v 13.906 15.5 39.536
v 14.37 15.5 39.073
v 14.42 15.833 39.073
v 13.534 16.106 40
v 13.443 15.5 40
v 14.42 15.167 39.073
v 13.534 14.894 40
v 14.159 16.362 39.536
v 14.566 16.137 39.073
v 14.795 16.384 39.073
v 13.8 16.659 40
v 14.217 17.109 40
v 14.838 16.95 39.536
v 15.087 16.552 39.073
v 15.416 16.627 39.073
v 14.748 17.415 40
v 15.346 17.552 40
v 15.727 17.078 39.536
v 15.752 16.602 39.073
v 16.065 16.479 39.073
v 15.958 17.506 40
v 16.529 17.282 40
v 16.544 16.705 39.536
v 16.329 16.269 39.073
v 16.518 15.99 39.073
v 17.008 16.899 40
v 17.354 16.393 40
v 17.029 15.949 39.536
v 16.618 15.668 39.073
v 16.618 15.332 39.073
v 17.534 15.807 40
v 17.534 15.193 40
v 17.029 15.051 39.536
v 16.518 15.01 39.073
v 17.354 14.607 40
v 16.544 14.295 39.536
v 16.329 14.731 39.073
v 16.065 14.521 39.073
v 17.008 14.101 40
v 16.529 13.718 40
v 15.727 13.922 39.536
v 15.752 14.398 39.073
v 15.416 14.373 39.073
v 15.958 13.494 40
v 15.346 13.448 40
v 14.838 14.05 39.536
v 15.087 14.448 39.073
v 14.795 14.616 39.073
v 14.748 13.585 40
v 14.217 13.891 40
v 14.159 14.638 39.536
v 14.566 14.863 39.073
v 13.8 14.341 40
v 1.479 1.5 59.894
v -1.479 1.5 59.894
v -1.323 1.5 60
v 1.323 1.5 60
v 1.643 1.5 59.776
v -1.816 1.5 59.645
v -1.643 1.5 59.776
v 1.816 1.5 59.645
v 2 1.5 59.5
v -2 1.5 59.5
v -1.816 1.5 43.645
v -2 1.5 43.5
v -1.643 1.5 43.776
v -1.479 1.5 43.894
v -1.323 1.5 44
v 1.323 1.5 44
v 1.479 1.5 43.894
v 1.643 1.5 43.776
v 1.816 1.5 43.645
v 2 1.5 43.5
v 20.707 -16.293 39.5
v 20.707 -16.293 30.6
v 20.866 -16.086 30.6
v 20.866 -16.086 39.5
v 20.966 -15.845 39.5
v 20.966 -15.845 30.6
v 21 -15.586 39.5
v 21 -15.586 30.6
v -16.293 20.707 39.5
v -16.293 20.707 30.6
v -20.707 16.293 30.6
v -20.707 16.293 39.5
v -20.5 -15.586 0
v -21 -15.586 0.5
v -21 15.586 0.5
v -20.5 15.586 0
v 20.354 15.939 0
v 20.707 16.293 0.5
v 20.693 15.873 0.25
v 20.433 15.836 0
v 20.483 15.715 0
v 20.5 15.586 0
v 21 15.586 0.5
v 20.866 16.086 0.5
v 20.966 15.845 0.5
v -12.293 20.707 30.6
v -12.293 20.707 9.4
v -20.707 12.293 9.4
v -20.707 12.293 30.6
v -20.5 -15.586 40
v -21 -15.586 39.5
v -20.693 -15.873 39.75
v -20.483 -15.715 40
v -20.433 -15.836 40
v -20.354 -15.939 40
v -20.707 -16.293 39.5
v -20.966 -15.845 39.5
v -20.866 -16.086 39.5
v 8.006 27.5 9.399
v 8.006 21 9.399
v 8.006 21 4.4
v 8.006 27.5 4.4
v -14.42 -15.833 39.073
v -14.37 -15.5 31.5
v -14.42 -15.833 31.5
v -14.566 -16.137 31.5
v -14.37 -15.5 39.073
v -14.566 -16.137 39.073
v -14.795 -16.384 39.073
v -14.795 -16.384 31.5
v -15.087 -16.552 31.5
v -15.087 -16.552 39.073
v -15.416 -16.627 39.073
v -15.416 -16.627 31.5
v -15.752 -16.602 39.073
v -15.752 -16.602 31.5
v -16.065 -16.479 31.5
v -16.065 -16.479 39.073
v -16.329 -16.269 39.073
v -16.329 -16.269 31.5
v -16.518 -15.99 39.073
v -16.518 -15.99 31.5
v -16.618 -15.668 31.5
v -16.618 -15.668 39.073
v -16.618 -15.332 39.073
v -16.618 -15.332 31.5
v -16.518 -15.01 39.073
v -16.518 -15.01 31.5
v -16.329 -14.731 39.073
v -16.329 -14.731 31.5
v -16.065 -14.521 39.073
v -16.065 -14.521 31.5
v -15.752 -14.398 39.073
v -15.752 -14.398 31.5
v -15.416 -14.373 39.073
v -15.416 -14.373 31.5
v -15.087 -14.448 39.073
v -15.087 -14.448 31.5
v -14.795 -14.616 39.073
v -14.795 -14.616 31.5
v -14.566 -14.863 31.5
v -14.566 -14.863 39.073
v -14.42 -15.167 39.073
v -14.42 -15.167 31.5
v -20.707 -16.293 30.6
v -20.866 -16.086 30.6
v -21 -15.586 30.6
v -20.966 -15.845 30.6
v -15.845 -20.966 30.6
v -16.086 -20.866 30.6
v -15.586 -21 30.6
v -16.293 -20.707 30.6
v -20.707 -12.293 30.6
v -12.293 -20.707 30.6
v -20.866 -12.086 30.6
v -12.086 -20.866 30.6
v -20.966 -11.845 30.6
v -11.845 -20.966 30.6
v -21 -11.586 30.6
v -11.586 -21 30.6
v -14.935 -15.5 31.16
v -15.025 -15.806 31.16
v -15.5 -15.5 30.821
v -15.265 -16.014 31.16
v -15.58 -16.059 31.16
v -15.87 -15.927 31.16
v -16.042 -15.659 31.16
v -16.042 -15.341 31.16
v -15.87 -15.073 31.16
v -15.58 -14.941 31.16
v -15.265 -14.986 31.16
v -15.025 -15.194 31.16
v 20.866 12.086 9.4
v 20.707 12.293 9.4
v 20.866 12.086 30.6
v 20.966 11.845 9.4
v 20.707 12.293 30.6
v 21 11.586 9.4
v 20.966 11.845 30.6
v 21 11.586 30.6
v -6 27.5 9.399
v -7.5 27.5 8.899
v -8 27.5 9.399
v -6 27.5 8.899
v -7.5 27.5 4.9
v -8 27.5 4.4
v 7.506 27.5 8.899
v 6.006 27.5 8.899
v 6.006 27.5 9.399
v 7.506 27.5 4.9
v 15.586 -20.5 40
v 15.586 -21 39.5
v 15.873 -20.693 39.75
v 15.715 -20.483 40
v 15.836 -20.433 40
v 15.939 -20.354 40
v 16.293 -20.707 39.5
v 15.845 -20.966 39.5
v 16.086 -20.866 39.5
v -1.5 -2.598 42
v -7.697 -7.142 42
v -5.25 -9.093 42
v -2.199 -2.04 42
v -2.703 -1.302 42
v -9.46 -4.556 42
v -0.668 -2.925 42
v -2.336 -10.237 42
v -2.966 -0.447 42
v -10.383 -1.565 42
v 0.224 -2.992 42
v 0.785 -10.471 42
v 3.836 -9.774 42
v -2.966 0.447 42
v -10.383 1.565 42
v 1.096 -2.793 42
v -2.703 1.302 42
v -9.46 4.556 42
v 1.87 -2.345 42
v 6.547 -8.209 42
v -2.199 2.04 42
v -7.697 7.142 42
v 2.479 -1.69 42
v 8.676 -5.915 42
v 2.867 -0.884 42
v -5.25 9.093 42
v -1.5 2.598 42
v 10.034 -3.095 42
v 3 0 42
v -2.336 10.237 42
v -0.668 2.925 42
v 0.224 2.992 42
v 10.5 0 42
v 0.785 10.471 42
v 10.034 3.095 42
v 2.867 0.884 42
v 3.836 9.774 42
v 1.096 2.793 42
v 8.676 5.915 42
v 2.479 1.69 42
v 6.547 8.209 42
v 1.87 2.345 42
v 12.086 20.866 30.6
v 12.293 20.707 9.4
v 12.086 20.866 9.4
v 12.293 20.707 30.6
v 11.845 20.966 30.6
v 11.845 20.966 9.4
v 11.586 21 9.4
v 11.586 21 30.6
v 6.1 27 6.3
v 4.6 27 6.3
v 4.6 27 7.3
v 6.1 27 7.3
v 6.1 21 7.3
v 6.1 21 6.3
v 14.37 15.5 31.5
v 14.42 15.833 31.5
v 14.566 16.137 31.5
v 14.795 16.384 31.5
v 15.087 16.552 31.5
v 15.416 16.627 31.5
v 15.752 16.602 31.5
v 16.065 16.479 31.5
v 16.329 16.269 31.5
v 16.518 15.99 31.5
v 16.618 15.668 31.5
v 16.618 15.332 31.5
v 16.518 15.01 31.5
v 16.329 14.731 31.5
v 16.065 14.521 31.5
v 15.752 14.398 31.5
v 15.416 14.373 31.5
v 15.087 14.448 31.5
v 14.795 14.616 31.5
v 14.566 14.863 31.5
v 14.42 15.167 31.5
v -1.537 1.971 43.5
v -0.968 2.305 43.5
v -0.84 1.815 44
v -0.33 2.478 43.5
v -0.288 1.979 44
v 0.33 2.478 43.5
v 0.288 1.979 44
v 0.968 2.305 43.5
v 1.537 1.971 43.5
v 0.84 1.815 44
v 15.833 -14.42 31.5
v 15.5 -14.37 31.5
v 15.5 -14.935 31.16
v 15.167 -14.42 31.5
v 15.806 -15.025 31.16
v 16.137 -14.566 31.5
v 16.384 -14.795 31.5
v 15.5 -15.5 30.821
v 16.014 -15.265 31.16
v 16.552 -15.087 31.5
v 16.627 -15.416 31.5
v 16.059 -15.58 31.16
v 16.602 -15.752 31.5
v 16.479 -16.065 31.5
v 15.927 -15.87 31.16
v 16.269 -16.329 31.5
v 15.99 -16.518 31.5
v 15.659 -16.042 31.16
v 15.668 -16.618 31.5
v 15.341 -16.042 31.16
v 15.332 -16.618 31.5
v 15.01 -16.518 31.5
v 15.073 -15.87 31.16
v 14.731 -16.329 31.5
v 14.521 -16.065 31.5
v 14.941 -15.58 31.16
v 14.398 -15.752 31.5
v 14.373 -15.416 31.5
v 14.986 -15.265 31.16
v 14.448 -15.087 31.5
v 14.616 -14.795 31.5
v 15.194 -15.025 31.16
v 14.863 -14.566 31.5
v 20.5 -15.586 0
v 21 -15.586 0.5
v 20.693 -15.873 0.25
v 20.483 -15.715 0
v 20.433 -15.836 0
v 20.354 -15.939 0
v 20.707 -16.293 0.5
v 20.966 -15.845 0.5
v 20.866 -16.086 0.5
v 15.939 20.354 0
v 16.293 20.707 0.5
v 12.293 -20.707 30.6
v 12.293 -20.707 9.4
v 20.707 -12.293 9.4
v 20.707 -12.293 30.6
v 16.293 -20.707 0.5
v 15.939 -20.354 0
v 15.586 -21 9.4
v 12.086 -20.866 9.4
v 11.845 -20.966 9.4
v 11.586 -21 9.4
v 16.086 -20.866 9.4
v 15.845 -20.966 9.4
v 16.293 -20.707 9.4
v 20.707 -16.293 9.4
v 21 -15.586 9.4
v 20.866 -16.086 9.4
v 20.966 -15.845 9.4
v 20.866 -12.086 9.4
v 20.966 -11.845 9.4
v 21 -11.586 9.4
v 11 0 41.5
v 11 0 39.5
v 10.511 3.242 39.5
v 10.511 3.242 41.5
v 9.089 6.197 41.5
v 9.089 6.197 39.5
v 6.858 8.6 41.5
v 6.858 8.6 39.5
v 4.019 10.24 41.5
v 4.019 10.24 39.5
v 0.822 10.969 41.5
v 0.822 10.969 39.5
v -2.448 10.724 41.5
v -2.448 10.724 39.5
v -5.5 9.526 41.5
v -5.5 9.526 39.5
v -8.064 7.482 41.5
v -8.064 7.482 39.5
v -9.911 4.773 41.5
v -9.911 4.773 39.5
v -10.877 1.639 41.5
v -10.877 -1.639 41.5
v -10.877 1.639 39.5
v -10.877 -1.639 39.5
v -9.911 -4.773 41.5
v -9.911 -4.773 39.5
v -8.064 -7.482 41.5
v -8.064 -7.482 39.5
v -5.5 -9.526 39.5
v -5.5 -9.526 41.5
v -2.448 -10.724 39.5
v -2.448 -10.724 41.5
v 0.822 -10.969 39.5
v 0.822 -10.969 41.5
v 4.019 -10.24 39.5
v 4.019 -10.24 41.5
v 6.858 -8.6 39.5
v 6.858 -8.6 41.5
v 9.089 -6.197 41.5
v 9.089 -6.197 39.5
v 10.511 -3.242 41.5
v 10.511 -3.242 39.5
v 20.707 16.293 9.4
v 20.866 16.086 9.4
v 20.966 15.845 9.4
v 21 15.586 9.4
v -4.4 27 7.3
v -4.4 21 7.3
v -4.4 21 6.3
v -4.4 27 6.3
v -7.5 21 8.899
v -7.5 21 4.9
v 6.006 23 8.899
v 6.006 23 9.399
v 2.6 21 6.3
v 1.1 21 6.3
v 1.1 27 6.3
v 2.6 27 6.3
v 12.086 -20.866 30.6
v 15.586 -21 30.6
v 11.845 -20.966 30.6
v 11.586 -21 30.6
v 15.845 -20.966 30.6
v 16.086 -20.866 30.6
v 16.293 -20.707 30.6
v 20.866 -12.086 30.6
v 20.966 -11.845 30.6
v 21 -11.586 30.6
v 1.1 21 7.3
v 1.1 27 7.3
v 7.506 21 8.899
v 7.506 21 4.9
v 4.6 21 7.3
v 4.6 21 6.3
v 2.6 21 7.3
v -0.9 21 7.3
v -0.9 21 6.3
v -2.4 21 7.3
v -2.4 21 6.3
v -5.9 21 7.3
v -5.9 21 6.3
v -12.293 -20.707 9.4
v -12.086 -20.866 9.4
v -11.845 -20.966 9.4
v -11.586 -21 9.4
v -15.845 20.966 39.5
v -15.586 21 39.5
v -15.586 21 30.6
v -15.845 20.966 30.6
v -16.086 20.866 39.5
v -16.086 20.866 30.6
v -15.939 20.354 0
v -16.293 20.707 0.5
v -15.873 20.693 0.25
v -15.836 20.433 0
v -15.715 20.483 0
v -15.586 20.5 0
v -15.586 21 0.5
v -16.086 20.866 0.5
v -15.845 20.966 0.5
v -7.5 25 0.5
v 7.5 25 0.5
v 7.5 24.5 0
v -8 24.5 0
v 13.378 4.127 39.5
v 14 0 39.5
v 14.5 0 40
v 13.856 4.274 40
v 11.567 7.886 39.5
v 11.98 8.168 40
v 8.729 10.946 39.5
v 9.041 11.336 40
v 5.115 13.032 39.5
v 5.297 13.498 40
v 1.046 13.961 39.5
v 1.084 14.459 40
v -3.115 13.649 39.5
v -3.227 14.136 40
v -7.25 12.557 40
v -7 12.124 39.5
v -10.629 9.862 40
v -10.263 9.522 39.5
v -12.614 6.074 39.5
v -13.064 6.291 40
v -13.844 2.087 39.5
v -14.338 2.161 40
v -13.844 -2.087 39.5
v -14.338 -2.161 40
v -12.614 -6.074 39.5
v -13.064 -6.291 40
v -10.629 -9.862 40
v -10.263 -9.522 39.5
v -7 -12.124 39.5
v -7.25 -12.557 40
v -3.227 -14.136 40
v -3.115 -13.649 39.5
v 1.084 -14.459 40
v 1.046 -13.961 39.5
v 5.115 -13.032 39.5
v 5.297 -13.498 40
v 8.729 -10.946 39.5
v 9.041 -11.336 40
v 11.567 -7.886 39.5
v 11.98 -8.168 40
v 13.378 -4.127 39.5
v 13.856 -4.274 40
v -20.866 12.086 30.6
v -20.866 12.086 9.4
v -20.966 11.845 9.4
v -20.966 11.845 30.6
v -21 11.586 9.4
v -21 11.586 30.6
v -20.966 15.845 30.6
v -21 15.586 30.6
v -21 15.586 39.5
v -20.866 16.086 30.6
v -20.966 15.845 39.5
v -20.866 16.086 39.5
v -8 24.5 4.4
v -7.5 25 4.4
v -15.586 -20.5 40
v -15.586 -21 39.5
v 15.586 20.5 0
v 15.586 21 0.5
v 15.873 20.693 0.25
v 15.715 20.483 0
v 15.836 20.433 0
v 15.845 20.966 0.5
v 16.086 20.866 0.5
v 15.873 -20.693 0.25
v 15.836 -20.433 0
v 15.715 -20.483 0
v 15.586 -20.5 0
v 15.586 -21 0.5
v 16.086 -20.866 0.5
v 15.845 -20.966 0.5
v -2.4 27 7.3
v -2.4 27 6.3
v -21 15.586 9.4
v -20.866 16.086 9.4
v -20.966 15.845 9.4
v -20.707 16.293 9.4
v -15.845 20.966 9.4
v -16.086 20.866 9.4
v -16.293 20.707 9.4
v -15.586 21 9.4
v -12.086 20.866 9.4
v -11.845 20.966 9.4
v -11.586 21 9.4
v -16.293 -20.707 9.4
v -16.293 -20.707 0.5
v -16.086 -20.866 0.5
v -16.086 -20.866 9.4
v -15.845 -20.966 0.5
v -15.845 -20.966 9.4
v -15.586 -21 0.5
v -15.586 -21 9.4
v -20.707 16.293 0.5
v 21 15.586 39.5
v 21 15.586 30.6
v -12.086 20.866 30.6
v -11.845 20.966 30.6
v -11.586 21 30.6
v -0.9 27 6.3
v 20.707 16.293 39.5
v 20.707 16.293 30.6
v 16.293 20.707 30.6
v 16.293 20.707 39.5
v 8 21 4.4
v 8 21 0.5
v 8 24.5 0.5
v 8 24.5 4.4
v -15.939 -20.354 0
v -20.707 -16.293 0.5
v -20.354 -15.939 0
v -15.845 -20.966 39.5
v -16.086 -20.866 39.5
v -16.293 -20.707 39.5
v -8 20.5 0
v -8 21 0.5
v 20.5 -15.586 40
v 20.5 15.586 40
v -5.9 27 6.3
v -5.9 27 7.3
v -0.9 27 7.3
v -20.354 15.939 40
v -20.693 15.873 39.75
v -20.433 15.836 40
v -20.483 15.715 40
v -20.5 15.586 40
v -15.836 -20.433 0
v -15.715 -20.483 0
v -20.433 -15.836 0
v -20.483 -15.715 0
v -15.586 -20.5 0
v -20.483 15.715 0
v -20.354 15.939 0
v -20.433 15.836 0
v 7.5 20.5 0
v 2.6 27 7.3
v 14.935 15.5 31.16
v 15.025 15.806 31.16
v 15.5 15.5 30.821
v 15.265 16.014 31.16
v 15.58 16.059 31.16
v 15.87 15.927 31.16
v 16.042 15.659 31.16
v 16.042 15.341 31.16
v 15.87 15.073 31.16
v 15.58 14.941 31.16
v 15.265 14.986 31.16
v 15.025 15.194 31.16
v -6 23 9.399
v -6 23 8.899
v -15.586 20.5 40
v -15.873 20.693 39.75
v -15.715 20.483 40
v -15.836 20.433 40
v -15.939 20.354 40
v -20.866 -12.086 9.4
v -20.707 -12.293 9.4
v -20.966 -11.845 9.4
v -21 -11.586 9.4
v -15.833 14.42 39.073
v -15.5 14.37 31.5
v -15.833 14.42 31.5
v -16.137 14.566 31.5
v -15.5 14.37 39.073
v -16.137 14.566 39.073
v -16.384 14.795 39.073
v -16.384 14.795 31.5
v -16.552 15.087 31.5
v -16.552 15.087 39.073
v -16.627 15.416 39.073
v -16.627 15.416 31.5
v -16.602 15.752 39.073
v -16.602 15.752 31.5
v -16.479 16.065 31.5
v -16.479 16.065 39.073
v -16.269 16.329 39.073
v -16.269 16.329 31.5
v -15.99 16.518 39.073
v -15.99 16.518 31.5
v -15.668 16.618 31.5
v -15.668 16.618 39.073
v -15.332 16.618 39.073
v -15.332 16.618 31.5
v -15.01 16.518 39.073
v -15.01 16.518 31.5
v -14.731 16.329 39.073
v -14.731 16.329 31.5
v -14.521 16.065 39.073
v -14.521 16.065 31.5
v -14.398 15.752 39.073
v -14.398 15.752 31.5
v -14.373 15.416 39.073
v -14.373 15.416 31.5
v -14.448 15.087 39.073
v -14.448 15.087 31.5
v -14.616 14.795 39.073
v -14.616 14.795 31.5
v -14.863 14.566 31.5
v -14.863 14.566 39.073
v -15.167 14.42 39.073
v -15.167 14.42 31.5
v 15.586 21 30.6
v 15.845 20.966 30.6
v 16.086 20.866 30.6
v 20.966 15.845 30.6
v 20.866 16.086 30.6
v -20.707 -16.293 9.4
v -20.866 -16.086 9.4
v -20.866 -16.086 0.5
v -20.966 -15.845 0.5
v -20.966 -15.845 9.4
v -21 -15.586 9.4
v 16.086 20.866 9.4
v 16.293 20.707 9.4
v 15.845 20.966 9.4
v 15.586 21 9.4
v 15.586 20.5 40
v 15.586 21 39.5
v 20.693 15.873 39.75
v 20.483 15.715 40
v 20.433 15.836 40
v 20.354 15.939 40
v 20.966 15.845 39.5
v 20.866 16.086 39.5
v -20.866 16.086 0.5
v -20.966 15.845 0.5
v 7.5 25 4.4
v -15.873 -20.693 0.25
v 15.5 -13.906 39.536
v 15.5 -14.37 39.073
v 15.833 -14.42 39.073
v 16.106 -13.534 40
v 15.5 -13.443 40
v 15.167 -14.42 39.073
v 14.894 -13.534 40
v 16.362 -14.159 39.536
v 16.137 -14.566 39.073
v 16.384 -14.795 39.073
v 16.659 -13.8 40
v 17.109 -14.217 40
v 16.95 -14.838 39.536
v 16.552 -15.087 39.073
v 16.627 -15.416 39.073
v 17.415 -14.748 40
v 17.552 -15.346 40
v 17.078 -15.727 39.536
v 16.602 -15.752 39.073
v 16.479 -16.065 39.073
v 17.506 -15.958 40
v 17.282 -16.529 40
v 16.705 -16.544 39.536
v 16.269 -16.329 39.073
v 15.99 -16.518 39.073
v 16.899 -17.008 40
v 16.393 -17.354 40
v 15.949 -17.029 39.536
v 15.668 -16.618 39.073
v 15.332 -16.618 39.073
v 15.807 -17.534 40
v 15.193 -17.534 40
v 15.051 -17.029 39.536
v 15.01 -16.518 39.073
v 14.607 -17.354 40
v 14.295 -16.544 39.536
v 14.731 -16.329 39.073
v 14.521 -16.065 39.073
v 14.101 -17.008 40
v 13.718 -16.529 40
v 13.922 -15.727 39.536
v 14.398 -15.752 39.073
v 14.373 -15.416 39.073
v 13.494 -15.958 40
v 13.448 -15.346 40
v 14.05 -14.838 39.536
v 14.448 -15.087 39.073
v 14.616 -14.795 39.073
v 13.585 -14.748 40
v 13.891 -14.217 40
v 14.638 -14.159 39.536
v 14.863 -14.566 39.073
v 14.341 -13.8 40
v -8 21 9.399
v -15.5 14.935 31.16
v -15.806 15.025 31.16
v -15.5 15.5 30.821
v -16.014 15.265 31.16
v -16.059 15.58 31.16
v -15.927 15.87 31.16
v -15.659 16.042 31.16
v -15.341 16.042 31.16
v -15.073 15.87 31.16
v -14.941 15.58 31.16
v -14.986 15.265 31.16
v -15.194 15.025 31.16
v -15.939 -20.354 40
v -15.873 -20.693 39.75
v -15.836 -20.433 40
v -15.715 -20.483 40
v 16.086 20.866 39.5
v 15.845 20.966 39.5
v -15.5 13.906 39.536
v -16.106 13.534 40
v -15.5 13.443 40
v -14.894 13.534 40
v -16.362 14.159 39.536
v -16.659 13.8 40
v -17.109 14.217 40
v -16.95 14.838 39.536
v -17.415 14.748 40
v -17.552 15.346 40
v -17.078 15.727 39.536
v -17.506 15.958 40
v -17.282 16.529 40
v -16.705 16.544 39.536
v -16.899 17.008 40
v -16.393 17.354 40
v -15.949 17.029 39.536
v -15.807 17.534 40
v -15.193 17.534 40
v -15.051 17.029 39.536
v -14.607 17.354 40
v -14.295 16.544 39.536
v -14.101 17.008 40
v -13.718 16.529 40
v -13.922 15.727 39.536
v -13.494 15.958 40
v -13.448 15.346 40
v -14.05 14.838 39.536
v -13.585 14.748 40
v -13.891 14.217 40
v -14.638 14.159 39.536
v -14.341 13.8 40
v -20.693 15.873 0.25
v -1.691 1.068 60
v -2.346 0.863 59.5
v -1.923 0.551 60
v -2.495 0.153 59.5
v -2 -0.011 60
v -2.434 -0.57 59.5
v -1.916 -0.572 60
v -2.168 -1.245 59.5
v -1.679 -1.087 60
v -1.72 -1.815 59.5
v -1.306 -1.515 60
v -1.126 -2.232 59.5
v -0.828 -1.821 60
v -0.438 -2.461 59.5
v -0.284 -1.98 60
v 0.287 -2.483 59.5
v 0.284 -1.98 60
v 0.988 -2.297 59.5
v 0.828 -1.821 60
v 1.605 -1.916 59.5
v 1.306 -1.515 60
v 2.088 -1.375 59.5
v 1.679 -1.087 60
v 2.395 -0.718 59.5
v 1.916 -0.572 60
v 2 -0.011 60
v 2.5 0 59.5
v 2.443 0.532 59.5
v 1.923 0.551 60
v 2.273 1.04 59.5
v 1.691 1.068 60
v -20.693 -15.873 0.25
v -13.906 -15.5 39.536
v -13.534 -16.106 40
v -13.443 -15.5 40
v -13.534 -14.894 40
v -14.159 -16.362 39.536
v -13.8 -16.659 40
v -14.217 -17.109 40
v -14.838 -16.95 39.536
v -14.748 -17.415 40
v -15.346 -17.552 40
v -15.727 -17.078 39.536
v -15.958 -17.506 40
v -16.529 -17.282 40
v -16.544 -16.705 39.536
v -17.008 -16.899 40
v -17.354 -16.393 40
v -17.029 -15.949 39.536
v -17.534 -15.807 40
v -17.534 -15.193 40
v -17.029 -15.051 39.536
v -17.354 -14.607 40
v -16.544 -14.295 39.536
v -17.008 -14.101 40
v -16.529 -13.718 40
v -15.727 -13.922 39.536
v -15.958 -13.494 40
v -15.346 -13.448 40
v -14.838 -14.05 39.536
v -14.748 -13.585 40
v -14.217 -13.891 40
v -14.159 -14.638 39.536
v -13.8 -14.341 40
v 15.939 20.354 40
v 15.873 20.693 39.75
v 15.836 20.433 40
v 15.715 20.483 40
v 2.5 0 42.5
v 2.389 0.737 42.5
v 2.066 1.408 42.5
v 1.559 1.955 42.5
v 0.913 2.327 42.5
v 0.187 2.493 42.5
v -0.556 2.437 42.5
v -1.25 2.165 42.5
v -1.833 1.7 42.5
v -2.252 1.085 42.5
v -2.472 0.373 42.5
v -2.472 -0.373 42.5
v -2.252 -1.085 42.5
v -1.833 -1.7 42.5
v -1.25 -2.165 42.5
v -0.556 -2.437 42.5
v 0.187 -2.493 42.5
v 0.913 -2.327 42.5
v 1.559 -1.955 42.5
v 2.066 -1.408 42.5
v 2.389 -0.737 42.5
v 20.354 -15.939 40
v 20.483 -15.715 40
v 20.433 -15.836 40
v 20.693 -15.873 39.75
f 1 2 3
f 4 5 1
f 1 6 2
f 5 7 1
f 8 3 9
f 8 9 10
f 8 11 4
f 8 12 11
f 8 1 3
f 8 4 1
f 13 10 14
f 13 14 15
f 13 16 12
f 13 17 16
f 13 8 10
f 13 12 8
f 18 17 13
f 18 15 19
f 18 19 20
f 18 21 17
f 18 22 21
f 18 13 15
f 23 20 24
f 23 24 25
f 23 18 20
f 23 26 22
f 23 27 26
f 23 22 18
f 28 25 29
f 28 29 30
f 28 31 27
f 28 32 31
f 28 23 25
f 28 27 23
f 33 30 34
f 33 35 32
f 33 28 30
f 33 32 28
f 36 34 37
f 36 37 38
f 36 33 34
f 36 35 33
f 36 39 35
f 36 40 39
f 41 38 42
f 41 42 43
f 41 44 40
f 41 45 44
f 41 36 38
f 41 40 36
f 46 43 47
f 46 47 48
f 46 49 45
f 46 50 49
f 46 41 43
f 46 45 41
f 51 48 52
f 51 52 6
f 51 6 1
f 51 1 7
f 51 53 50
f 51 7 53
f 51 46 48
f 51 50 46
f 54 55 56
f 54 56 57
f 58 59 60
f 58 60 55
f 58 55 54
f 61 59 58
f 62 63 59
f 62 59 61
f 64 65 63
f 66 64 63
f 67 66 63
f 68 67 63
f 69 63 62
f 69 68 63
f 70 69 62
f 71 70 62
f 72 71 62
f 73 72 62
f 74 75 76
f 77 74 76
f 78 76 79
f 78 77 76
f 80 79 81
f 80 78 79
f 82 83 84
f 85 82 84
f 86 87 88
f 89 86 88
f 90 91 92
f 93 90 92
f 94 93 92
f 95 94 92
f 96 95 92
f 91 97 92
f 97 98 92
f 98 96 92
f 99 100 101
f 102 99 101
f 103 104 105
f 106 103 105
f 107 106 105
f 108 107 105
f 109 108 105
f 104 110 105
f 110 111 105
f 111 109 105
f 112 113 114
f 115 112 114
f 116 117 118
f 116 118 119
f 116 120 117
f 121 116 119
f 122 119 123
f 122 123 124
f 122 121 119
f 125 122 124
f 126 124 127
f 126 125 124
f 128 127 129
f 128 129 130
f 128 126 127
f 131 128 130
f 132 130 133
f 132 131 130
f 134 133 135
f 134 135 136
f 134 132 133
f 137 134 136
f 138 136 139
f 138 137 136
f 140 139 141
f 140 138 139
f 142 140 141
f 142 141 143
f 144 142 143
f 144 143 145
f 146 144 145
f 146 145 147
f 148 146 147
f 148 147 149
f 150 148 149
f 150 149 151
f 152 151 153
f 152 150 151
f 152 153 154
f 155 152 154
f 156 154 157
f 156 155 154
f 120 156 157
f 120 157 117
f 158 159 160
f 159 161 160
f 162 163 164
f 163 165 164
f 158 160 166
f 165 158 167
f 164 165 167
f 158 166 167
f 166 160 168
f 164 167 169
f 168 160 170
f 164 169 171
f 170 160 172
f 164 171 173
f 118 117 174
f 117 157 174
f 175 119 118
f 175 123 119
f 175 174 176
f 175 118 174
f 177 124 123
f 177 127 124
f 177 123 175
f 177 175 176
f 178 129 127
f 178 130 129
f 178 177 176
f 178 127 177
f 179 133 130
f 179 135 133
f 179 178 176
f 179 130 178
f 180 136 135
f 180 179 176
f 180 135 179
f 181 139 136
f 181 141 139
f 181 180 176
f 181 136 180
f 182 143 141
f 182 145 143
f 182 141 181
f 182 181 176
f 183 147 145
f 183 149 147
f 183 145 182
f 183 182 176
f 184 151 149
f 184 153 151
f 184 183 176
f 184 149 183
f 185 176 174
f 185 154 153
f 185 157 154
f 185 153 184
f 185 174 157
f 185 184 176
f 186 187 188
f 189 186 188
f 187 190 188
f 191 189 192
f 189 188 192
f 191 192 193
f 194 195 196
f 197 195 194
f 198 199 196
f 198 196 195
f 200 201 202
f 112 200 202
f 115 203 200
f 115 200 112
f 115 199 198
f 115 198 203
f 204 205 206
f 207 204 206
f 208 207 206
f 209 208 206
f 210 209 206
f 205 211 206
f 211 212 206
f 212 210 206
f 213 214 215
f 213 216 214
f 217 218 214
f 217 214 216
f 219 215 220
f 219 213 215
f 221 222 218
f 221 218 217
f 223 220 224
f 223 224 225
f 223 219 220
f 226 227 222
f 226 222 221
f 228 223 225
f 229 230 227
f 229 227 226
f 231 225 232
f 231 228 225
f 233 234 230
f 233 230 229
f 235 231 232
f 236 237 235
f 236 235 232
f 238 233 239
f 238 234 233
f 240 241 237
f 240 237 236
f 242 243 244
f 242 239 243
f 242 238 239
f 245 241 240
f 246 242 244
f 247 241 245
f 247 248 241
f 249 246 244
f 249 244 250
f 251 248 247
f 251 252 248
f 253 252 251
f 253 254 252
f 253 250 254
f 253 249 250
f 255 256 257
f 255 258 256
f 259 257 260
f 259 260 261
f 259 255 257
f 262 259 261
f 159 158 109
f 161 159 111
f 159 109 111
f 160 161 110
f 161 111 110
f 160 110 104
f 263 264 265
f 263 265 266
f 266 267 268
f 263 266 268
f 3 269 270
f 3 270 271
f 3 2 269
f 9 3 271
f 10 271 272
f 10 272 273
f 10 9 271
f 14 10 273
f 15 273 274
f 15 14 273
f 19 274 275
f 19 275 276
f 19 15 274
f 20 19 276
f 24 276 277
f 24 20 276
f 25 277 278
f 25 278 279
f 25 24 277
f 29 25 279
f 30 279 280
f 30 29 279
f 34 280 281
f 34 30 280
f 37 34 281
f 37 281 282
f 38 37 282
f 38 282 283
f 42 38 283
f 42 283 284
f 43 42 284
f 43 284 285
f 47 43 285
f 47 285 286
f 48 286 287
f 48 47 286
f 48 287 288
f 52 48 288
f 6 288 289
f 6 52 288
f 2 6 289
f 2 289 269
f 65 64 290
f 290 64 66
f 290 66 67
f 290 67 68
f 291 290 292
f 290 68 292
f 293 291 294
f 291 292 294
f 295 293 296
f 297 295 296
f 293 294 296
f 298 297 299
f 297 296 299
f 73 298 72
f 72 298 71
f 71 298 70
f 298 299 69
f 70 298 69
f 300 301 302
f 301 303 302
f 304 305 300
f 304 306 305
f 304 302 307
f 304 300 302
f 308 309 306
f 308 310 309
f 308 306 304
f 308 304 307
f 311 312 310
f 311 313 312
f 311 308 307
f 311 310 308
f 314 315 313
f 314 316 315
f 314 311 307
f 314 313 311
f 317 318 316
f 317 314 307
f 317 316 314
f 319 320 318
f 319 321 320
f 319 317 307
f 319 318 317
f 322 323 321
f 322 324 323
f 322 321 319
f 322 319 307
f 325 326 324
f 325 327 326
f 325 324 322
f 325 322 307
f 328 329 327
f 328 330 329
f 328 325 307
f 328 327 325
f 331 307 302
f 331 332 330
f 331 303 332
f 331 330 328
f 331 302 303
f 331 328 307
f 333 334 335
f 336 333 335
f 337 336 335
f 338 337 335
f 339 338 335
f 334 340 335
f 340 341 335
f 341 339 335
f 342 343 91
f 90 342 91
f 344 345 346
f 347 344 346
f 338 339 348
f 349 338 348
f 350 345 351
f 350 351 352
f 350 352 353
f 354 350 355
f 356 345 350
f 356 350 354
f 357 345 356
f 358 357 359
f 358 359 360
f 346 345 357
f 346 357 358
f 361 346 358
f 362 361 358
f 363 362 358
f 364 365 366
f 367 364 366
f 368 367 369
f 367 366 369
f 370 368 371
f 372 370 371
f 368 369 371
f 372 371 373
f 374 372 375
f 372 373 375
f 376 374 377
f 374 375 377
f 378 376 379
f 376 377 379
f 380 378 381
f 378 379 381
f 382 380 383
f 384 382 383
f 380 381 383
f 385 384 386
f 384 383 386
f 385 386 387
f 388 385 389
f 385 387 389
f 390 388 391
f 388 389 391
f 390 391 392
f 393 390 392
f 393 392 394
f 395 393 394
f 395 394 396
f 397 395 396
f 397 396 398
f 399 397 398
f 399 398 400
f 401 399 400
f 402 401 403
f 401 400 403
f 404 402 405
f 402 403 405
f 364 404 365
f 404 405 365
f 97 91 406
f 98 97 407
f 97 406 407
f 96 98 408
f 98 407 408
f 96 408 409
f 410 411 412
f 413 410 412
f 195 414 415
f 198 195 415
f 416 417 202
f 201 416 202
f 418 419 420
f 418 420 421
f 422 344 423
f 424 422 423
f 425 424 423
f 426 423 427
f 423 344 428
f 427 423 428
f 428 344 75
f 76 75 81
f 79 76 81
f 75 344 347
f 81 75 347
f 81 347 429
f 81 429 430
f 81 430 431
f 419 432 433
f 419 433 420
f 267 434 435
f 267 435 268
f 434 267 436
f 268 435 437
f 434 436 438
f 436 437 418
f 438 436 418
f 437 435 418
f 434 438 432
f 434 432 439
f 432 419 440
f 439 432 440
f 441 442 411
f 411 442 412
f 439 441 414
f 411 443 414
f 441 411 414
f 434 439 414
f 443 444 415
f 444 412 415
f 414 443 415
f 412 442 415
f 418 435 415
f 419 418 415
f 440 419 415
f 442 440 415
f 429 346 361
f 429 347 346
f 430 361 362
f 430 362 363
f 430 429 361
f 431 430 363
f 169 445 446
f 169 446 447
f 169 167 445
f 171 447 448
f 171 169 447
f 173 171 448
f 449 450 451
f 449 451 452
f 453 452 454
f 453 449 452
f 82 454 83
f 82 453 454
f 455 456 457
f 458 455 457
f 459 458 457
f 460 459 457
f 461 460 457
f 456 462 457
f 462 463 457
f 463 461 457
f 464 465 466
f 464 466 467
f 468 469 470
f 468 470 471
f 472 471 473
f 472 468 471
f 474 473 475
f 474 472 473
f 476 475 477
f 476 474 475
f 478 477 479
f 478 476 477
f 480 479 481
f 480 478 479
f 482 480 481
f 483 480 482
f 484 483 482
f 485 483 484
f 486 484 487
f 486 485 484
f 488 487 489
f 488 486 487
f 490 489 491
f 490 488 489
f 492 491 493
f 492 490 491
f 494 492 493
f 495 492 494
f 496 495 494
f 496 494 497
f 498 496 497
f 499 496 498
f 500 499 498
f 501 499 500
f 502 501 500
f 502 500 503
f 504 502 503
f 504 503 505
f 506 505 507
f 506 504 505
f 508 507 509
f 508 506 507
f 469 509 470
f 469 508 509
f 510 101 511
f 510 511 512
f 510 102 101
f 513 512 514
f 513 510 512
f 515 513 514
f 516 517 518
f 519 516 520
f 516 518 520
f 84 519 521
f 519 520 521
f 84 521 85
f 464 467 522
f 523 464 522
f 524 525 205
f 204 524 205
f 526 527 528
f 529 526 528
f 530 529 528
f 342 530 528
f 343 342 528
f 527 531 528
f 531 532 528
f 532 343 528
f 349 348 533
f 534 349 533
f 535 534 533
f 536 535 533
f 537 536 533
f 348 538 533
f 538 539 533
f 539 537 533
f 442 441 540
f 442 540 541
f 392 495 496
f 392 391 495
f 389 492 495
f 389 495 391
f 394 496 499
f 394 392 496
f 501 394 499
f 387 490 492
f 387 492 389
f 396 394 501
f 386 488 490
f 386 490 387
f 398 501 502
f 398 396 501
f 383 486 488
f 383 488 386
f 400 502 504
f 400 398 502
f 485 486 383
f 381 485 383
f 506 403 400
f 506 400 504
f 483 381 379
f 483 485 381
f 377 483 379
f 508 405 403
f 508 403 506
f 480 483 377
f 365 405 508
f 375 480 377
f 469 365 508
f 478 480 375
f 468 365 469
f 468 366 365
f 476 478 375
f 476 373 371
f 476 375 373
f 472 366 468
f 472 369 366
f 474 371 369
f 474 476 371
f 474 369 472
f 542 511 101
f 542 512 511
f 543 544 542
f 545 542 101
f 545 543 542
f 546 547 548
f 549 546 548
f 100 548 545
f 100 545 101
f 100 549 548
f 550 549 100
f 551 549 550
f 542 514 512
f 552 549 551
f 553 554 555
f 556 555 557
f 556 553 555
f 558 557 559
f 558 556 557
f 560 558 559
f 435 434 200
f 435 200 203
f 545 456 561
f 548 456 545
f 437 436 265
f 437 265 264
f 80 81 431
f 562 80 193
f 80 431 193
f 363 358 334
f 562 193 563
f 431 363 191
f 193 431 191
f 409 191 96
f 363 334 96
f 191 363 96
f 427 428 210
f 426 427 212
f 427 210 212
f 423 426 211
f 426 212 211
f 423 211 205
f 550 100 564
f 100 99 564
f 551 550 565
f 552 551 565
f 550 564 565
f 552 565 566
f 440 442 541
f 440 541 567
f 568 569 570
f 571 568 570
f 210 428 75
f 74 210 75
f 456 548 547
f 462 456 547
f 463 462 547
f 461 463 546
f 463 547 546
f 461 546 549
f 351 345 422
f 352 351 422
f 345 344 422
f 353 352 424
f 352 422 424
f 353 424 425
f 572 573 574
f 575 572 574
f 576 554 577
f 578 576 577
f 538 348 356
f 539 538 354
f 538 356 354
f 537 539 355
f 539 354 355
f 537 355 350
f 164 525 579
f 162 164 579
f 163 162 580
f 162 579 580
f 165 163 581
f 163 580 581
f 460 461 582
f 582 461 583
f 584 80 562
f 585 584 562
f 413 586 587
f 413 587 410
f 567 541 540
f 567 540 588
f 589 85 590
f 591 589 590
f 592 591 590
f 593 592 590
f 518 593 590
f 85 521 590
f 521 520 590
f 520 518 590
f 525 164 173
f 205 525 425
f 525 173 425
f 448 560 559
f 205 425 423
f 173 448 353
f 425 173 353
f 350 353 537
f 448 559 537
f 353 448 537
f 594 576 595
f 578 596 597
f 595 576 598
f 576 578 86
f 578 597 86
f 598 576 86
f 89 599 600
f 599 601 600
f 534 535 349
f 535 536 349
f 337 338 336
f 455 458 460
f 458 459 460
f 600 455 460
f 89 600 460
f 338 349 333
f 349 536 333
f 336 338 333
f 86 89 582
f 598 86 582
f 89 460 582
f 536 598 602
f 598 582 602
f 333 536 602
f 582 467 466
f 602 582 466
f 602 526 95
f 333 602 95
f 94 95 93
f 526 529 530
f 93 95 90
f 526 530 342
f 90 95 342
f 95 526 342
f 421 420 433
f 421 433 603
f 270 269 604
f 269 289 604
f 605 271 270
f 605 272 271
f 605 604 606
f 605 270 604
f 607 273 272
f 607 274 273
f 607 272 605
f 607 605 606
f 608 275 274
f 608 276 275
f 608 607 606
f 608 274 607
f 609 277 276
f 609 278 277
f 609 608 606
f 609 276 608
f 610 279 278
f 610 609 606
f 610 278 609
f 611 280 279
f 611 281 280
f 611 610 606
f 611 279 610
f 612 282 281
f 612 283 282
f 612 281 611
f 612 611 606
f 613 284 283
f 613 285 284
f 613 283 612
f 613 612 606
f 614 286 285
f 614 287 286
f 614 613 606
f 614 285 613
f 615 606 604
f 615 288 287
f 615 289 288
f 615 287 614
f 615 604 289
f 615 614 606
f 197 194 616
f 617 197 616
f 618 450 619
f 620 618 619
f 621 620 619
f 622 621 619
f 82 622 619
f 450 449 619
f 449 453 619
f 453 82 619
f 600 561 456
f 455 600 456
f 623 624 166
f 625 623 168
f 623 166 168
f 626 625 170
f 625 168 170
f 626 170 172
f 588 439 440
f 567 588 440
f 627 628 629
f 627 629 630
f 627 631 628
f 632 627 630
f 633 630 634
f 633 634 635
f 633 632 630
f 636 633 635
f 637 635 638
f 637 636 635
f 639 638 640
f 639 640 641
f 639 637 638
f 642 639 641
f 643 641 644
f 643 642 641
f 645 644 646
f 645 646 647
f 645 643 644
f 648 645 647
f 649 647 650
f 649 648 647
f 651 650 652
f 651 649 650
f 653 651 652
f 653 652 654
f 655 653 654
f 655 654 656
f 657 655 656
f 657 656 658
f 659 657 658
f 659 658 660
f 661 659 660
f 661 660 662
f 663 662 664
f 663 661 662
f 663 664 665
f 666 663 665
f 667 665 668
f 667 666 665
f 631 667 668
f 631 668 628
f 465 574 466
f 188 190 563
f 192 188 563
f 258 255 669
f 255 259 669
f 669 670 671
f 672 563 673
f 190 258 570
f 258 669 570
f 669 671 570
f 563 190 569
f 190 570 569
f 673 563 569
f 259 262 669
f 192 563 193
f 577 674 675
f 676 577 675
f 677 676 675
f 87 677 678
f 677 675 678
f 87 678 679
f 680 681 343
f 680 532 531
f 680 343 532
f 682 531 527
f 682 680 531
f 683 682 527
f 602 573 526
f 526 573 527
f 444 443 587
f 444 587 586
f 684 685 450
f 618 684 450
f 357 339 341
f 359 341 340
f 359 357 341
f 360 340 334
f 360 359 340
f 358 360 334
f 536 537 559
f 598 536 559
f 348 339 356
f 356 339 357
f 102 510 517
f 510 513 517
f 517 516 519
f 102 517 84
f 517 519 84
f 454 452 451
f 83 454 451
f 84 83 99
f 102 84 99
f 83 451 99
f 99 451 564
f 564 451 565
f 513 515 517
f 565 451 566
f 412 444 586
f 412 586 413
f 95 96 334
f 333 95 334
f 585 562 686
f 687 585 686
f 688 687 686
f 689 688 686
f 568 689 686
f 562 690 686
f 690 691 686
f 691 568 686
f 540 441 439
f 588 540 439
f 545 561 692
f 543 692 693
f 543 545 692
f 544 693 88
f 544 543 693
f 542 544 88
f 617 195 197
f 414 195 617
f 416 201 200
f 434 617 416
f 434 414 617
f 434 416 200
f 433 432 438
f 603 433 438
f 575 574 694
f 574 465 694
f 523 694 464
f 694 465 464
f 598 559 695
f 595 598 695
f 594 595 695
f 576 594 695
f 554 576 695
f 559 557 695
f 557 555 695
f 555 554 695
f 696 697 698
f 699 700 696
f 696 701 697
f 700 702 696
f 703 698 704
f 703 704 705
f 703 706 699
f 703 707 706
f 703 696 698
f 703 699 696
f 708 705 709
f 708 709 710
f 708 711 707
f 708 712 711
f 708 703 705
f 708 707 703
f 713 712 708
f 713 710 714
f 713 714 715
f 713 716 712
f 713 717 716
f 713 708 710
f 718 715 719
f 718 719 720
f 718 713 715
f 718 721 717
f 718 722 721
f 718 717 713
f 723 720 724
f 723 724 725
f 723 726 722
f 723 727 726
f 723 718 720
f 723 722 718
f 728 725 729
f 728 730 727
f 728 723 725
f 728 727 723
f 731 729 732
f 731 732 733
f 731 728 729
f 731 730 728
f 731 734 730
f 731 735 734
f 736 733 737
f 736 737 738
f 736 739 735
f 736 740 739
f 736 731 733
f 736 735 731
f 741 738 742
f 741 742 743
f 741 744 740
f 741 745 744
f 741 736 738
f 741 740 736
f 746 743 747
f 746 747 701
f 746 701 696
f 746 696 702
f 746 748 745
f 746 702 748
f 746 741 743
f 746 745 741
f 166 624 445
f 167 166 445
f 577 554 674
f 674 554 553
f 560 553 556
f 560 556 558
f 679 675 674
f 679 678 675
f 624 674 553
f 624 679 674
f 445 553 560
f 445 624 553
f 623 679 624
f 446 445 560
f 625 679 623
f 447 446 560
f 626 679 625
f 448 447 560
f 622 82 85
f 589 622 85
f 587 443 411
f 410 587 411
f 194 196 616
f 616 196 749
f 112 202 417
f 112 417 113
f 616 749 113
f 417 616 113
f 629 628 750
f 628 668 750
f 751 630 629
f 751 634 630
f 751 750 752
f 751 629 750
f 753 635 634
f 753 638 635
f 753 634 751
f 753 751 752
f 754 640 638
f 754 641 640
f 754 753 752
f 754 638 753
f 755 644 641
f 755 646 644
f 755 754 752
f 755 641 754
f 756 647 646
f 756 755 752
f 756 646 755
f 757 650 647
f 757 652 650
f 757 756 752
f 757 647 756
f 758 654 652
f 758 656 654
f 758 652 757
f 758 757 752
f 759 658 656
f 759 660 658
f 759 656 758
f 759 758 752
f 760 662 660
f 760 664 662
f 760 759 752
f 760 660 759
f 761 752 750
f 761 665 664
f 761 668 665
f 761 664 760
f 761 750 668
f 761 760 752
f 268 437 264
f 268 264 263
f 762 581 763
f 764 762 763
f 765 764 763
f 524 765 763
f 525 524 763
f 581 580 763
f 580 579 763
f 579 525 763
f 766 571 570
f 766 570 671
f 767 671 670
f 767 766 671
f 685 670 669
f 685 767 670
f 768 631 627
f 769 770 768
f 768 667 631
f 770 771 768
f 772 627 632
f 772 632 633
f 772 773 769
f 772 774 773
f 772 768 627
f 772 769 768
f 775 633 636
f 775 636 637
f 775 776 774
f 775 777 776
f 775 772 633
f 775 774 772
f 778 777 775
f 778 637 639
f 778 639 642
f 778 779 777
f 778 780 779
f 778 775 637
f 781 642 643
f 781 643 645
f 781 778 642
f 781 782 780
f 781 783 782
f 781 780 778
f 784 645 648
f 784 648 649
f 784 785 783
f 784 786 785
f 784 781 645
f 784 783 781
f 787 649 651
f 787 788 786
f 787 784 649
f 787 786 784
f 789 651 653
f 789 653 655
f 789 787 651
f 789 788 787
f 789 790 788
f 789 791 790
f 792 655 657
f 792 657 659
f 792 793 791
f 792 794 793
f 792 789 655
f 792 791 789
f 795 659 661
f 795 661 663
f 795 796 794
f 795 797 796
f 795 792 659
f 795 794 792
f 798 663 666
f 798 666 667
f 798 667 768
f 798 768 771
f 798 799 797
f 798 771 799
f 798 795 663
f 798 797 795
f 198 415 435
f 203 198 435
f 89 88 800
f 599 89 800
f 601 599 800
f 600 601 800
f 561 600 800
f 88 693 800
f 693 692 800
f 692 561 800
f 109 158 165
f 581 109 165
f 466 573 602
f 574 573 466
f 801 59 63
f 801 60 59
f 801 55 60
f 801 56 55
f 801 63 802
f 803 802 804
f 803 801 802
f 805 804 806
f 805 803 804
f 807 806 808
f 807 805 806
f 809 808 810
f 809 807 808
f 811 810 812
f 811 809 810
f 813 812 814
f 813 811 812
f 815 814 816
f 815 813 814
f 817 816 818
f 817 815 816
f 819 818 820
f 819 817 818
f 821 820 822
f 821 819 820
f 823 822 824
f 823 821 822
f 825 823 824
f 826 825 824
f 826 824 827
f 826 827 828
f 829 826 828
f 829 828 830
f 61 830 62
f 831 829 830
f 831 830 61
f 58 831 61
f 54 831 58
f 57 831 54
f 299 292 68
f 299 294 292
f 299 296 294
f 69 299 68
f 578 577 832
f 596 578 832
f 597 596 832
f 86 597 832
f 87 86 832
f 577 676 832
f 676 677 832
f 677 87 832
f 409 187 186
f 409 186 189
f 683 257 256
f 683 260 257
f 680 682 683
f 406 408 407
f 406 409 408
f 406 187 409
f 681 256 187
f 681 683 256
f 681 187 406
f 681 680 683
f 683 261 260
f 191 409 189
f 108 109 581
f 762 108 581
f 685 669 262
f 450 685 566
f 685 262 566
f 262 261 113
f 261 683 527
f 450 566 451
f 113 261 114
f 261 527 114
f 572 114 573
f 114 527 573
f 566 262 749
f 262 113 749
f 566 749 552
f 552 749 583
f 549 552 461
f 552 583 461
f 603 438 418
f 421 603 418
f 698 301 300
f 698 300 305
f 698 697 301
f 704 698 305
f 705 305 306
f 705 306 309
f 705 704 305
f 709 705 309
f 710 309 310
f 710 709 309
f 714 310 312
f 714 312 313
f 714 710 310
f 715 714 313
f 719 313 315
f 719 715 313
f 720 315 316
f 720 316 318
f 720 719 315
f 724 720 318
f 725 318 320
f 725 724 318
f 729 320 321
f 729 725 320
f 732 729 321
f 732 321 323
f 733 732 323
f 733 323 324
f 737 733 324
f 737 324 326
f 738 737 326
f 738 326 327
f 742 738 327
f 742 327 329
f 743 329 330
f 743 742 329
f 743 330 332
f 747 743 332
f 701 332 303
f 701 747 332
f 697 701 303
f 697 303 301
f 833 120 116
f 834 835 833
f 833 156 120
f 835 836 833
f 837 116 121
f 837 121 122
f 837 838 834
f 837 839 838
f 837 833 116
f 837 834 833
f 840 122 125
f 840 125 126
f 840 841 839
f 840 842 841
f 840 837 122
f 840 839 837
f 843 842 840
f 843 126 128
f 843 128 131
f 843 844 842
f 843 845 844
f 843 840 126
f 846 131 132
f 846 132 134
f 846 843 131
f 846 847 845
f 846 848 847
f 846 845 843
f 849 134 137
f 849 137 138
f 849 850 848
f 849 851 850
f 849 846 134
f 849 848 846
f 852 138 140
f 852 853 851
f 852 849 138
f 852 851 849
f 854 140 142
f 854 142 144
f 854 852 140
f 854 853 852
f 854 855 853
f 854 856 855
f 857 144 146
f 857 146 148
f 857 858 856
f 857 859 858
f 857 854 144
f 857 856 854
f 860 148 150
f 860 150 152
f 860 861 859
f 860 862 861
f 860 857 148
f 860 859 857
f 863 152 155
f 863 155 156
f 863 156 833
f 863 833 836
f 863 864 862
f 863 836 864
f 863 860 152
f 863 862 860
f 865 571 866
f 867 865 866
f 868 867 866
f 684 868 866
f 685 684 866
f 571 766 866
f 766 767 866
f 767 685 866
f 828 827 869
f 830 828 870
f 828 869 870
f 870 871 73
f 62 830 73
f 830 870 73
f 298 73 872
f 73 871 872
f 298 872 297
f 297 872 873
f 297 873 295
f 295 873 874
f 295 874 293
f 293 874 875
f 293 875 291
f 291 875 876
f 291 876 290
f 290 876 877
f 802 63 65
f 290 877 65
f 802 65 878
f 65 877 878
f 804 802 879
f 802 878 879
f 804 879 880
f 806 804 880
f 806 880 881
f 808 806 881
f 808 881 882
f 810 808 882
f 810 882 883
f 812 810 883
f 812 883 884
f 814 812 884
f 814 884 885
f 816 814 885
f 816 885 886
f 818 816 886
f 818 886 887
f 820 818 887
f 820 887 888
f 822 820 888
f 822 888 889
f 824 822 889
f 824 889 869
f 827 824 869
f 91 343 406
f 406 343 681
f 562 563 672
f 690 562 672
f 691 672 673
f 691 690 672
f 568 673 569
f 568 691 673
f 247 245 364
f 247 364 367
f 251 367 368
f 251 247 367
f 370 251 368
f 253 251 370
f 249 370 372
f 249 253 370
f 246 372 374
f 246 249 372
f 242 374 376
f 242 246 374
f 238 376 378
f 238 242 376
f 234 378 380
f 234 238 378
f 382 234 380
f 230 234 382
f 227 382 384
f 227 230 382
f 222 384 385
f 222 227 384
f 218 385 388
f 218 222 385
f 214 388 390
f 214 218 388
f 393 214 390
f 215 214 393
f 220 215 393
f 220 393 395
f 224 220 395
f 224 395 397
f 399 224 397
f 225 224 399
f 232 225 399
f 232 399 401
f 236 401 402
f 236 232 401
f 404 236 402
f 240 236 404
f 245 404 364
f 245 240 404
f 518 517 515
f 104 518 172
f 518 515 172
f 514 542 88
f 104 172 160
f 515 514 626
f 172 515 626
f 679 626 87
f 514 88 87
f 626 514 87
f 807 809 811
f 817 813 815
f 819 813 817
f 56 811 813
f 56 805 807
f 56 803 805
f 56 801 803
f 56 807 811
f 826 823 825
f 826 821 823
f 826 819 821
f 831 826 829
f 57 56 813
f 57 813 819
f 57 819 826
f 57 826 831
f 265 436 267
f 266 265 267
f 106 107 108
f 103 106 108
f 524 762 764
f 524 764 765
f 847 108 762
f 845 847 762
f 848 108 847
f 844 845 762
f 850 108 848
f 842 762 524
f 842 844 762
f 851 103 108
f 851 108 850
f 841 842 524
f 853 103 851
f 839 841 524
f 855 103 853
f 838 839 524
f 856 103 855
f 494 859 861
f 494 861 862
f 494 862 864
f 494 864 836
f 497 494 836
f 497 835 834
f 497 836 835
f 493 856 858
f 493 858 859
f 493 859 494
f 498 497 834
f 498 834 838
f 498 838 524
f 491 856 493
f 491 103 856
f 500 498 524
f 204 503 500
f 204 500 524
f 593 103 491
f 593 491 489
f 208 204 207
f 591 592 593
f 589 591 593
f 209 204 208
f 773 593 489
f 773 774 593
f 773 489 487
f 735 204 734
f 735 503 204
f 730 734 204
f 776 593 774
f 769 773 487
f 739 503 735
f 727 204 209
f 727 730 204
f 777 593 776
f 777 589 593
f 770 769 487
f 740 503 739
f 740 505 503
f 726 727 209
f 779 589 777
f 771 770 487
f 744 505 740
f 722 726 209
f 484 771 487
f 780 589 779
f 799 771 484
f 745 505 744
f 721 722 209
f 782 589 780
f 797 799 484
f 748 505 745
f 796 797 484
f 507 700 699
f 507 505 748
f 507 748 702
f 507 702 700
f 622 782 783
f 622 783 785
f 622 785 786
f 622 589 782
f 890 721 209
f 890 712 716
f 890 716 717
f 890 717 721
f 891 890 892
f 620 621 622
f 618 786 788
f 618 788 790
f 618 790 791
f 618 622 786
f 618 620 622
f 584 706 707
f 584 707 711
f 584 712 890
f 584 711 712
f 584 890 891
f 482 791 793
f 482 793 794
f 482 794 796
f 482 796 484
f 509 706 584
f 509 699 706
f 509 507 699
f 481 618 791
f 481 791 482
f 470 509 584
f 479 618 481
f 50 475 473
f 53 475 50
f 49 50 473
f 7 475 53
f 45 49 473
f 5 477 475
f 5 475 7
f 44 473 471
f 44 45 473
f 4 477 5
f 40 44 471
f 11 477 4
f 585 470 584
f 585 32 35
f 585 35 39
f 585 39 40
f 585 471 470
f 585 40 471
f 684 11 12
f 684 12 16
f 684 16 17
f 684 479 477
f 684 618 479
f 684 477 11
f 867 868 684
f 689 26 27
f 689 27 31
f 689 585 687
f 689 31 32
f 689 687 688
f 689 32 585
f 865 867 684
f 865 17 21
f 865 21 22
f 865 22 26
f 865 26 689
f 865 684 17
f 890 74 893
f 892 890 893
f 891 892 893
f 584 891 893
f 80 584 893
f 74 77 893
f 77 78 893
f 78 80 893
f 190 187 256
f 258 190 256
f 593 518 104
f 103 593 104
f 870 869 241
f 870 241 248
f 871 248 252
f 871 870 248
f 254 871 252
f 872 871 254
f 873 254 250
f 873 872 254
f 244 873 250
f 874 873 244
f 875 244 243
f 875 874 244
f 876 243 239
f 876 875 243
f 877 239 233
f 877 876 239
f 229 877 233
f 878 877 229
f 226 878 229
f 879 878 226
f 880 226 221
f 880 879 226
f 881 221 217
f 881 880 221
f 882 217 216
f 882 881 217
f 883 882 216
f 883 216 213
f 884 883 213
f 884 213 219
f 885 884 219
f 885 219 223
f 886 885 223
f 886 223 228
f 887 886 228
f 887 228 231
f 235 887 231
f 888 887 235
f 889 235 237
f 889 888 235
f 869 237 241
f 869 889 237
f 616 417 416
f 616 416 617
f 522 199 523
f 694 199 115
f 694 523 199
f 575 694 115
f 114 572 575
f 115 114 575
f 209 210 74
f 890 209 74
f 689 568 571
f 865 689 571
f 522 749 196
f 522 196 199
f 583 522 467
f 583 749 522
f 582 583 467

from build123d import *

# Parameters (mm, degrees)
SKETCH1_W               = 42
SKETCH1_H               = 42
BOSS_EXTRUDE1_DEPTH     = 9.4
CHAMFER1_SIZE           = 5
BOSS_EXTRUDE3_DEPTH     = 21.2
BOSS_EXTRUDE6_DEPTH     = 9.4
SKETCH6_W               = 16
SKETCH6_H               = 4
BOSS_EXTRUDE7_DEPTH     = 4.4
SKETCH7_W               = 16.005281852
SKETCH7_H               = 4.99851403
SKETCH7_W_2             = 15.005281852
SKETCH7_H_2             = 3.99851403
BOSS_EXTRUDE8_DEPTH     = 6.5
CUT_EXTRUDE1_DEPTH      = 0.5
SKETCH9_W               = 1.5
SKETCH9_H               = 1
BOSS_EXTRUDE9_DEPTH     = 6
SKETCH10_R              = 11
BOSS_EXTRUDE10_DEPTH    = 2
SKETCH11_R              = 2.5
BOSS_EXTRUDE11_DEPTH    = 18
CUT_EXTRUDE3_DEPTH      = 70.262183044
CUT_EXTRUDE3_DEPTH_BACK = 16
CUT_EXTRUDE4_START      = -0.5
SKETCH13_R              = 14
SKETCH13_R_2            = 11
CUT_EXTRUDE4_DEPTH      = 0.5
CIRPATTERN2_COUNT       = 4
CHAMFER3_SIZE           = 0.5
FILLET1_R               = 1
CHAMFER4_SIZE           = 0.5


with BuildPart() as part:
    # Sketch1 → Boss-Extrude1 (new body)
    with BuildSketch(Plane.XY):
        Rectangle(SKETCH1_W, SKETCH1_H)
    extrude(amount=BOSS_EXTRUDE1_DEPTH)

    # Chamfer1
    chamfer1_edges = [part.edges().sort_by_distance(p)[0] for p in [
        (-21, 21, 4.7),
        (21, 21, 4.7),
        (21, -21, 4.7),
        (-21, -21, 4.7),
    ]]
    chamfer(chamfer1_edges, length=CHAMFER1_SIZE)

    # Sketch3 → Boss-Extrude3 (add)
    with BuildSketch(Plane.XY.offset(9.4)):
        Polygon((-12, 21), (-21, 12), (-21, -12), (-12, -21), (12, -21), (21, -12), (21, 12), (12, 21), align=None)
    extrude(amount=BOSS_EXTRUDE3_DEPTH)

    # Sketch5 → Boss-Extrude6 (add)
    with BuildSketch(Plane.XY.offset(30.6)):
        Polygon((21, 12), (12, 21), (-12, 21), (-21, 12), (-21, -12), (-12, -21), (12, -21), (21, -12), align=None)
        Polygon((-12, 21), (-16, 21), (-21, 16), (-21, 12), align=None)
        Polygon((16, 21), (12, 21), (21, 12), (21, 16), align=None)
        Polygon((21, -16), (21, -12), (12, -21), (16, -21), align=None)
        Polygon((-12, -21), (-21, -12), (-21, -16), (-16, -21), align=None)
    extrude(amount=BOSS_EXTRUDE6_DEPTH)

    # Sketch6 → Boss-Extrude7 (add)
    with BuildSketch(Plane(origin=(0, 0, 0), x_dir=(-1, 0, 0), z_dir=(0, 0, -1))):
        with Locations((-0.000479461, 23)):
            Rectangle(SKETCH6_W, SKETCH6_H)
    extrude(amount=-BOSS_EXTRUDE7_DEPTH)

    # Sketch7 → Boss-Extrude8 (add)
    with BuildSketch(Plane(origin=(0, 21, 0), x_dir=(1, 0, 0), z_dir=(0, 1, 0))):
        with Locations((0.003120387, -6.899257015)):
            Rectangle(SKETCH7_W, SKETCH7_H)
        with Locations((0.003120387, -6.899257015)):
            Rectangle(SKETCH7_W_2, SKETCH7_H_2, mode=Mode.SUBTRACT)
    extrude(amount=BOSS_EXTRUDE8_DEPTH)

    # Sketch8 → Cut-Extrude1 (cut)
    with BuildSketch(Plane.XY.offset(9.39851403)):
        Polygon((-5.999520539, 25.5), (-5.999520539, 29.381183142), (6.005761313, 29.381183142), (6.005761313, 25.5), (6.005761313, 23), (-5.999520539, 23), align=None)
    extrude(amount=-CUT_EXTRUDE1_DEPTH, mode=Mode.SUBTRACT)

    # Sketch9 → Boss-Extrude9 (add)
    with BuildSketch(Plane(origin=(0, 21, 0), x_dir=(1, 0, 0), z_dir=(0, 1, 0))):
        with Locations((-5.149520539, -6.8)):
            Rectangle(SKETCH9_W, SKETCH9_H)
        with Locations((-1.649520539, -6.8)):
            Rectangle(SKETCH9_W, SKETCH9_H)
        with Locations((1.850479461, -6.8)):
            Rectangle(SKETCH9_W, SKETCH9_H)
        with Locations((5.350479461, -6.8)):
            Rectangle(SKETCH9_W, SKETCH9_H)
    extrude(amount=BOSS_EXTRUDE9_DEPTH)

    # Sketch10 → Boss-Extrude10 (add)
    with BuildSketch(Plane.XY.offset(40)):
        Circle(SKETCH10_R)
    extrude(amount=BOSS_EXTRUDE10_DEPTH)

    # Sketch11 → Boss-Extrude11 (add)
    with BuildSketch(Plane.XY.offset(42)):
        Circle(SKETCH11_R)
    extrude(amount=BOSS_EXTRUDE11_DEPTH)

    # Sketch12 → Cut-Extrude3 (cut, two sides: drawn at the far end of the back side and taken through both)
    with BuildSketch(Plane.XY.offset(60).offset(-CUT_EXTRUDE3_DEPTH_BACK)):
        Polygon((-81.426219831, 1.5), (-2, 1.5), (2, 1.5), (81.426219831, 1.5), (81.426219831, 160.352439662), (-81.426219831, 160.352439662), align=None)
    extrude(amount=CUT_EXTRUDE3_DEPTH + CUT_EXTRUDE3_DEPTH_BACK, mode=Mode.SUBTRACT)

    # Sketch13 → Cut-Extrude4 (cut)
    with BuildSketch(Plane.XY.offset(40).offset(CUT_EXTRUDE4_START)):
        Circle(SKETCH13_R)
        Circle(SKETCH13_R_2, mode=Mode.SUBTRACT)
    extrude(amount=CUT_EXTRUDE4_DEPTH, mode=Mode.SUBTRACT)

    # Sketch15 → #4-40 Tapped Hole1 (revolve, cut)
    with BuildSketch(Plane(origin=(-15.5, 15.5, 40), x_dir=(0, -1, 0), z_dir=(1, 0, 0))):
        Polygon((0, 0), (0, 9.179152758), (1.1303, 8.5), (1.1303, 0.9271), (2.0574, 0), align=None)
    f_4_40_tapped_hole1 = revolve(axis=Axis((-15.5, 15.5, 46.35), (0, 0, -1)), mode=Mode.SUBTRACT)

    # CirPattern2: #4-40 Tapped Hole1 ×4 about axis
    cirpattern2_axis = Axis((0, 0, 0), (0, 0, 1))
    for i in range(1, CIRPATTERN2_COUNT):
        add(f_4_40_tapped_hole1.rotate(cirpattern2_axis, i * 360 / CIRPATTERN2_COUNT), mode=Mode.SUBTRACT)

    # Chamfer3
    chamfer3_edges = [part.edges().sort_by_distance(p)[0] for p in [
        (-11, 0, 42),
        (-2.5, 0, 42),
        (-0.790569415, -2.371708245, 60),
        (0, 2.5, 44),
        (-14, 0, 40),
    ]]
    chamfer(chamfer3_edges, length=CHAMFER3_SIZE - 0.0001)  # a hair under: the kernel refuses the full size

    # Fillet1
    fillet1_edges = [part.edges().sort_by_distance(p)[0] for p in [
        (21, 16, 4.7),
        (21, -16, 4.7),
        (-16, -21, 4.7),
        (16, -21, 4.7),
        (-21, 16, 4.7),
        (-21, -16, 4.7),
        (16, 21, 4.7),
        (-16, 21, 4.7),
        (12, 21, 20),
        (-12, 21, 20),
        (-21, 12, 20),
        (-21, -12, 20),
        (-12, -21, 20),
        (12, -21, 20),
        (21, -12, 20),
        (21, 12, 20),
        (21, -16, 35.3),
        (21, 16, 35.3),
        (16, 21, 35.3),
        (-16, 21, 35.3),
        (-21, 16, 35.3),
        (-21, -16, 35.3),
        (-16, -21, 35.3),
        (16, -21, 35.3),
    ]]
    fillet(fillet1_edges, radius=FILLET1_R)

    # Chamfer4
    chamfer4_edges = [part.edges().sort_by_distance(p)[0] for p in [
        (-11.792653488, 21, 0),
        (8.000479461, 25, 2.2),
        (-7.999520539, 25, 2.2),
        (8.000479461, 23, 0),
        (0.000479461, 25, 0),
        (0, 21, 40),
        (11.79313295, 21, 0),
        (-18.5, 18.5, 0),
        (21, 0, 0),
        (18.5, -18.5, 0),
        (0, -21, 0),
        (-18.5, -18.5, 0),
        (-21, 0, 0),
        (18.5, 18.5, 0),
        (20.923879533, 15.96846987, 0),
        (15.96846987, 20.923879533, 0),
        (20.923879533, -15.96846987, 0),
        (15.96846987, -20.923879533, 0),
        (-15.96846987, -20.923879533, 0),
        (-20.923879533, -15.96846987, 0),
        (-20.923879533, 15.96846987, 0),
        (-15.96846987, 20.923879533, 0),
        (-18.5, 18.5, 40),
        (21, 0, 40),
        (18.5, 18.5, 40),
        (-21, 0, 40),
        (-18.5, -18.5, 40),
        (0, -21, 40),
        (18.5, -18.5, 40),
        (15.96846987, 20.923879533, 40),
        (20.923879533, 15.96846987, 40),
        (20.923879533, -15.96846987, 40),
        (15.96846987, -20.923879533, 40),
        (-15.96846987, -20.923879533, 40),
        (-20.923879533, -15.96846987, 40),
        (-20.923879533, 15.96846987, 40),
        (-15.96846987, 20.923879533, 40),
    ]]
    chamfer(chamfer4_edges, length=CHAMFER4_SIZE)


solid = part.part
